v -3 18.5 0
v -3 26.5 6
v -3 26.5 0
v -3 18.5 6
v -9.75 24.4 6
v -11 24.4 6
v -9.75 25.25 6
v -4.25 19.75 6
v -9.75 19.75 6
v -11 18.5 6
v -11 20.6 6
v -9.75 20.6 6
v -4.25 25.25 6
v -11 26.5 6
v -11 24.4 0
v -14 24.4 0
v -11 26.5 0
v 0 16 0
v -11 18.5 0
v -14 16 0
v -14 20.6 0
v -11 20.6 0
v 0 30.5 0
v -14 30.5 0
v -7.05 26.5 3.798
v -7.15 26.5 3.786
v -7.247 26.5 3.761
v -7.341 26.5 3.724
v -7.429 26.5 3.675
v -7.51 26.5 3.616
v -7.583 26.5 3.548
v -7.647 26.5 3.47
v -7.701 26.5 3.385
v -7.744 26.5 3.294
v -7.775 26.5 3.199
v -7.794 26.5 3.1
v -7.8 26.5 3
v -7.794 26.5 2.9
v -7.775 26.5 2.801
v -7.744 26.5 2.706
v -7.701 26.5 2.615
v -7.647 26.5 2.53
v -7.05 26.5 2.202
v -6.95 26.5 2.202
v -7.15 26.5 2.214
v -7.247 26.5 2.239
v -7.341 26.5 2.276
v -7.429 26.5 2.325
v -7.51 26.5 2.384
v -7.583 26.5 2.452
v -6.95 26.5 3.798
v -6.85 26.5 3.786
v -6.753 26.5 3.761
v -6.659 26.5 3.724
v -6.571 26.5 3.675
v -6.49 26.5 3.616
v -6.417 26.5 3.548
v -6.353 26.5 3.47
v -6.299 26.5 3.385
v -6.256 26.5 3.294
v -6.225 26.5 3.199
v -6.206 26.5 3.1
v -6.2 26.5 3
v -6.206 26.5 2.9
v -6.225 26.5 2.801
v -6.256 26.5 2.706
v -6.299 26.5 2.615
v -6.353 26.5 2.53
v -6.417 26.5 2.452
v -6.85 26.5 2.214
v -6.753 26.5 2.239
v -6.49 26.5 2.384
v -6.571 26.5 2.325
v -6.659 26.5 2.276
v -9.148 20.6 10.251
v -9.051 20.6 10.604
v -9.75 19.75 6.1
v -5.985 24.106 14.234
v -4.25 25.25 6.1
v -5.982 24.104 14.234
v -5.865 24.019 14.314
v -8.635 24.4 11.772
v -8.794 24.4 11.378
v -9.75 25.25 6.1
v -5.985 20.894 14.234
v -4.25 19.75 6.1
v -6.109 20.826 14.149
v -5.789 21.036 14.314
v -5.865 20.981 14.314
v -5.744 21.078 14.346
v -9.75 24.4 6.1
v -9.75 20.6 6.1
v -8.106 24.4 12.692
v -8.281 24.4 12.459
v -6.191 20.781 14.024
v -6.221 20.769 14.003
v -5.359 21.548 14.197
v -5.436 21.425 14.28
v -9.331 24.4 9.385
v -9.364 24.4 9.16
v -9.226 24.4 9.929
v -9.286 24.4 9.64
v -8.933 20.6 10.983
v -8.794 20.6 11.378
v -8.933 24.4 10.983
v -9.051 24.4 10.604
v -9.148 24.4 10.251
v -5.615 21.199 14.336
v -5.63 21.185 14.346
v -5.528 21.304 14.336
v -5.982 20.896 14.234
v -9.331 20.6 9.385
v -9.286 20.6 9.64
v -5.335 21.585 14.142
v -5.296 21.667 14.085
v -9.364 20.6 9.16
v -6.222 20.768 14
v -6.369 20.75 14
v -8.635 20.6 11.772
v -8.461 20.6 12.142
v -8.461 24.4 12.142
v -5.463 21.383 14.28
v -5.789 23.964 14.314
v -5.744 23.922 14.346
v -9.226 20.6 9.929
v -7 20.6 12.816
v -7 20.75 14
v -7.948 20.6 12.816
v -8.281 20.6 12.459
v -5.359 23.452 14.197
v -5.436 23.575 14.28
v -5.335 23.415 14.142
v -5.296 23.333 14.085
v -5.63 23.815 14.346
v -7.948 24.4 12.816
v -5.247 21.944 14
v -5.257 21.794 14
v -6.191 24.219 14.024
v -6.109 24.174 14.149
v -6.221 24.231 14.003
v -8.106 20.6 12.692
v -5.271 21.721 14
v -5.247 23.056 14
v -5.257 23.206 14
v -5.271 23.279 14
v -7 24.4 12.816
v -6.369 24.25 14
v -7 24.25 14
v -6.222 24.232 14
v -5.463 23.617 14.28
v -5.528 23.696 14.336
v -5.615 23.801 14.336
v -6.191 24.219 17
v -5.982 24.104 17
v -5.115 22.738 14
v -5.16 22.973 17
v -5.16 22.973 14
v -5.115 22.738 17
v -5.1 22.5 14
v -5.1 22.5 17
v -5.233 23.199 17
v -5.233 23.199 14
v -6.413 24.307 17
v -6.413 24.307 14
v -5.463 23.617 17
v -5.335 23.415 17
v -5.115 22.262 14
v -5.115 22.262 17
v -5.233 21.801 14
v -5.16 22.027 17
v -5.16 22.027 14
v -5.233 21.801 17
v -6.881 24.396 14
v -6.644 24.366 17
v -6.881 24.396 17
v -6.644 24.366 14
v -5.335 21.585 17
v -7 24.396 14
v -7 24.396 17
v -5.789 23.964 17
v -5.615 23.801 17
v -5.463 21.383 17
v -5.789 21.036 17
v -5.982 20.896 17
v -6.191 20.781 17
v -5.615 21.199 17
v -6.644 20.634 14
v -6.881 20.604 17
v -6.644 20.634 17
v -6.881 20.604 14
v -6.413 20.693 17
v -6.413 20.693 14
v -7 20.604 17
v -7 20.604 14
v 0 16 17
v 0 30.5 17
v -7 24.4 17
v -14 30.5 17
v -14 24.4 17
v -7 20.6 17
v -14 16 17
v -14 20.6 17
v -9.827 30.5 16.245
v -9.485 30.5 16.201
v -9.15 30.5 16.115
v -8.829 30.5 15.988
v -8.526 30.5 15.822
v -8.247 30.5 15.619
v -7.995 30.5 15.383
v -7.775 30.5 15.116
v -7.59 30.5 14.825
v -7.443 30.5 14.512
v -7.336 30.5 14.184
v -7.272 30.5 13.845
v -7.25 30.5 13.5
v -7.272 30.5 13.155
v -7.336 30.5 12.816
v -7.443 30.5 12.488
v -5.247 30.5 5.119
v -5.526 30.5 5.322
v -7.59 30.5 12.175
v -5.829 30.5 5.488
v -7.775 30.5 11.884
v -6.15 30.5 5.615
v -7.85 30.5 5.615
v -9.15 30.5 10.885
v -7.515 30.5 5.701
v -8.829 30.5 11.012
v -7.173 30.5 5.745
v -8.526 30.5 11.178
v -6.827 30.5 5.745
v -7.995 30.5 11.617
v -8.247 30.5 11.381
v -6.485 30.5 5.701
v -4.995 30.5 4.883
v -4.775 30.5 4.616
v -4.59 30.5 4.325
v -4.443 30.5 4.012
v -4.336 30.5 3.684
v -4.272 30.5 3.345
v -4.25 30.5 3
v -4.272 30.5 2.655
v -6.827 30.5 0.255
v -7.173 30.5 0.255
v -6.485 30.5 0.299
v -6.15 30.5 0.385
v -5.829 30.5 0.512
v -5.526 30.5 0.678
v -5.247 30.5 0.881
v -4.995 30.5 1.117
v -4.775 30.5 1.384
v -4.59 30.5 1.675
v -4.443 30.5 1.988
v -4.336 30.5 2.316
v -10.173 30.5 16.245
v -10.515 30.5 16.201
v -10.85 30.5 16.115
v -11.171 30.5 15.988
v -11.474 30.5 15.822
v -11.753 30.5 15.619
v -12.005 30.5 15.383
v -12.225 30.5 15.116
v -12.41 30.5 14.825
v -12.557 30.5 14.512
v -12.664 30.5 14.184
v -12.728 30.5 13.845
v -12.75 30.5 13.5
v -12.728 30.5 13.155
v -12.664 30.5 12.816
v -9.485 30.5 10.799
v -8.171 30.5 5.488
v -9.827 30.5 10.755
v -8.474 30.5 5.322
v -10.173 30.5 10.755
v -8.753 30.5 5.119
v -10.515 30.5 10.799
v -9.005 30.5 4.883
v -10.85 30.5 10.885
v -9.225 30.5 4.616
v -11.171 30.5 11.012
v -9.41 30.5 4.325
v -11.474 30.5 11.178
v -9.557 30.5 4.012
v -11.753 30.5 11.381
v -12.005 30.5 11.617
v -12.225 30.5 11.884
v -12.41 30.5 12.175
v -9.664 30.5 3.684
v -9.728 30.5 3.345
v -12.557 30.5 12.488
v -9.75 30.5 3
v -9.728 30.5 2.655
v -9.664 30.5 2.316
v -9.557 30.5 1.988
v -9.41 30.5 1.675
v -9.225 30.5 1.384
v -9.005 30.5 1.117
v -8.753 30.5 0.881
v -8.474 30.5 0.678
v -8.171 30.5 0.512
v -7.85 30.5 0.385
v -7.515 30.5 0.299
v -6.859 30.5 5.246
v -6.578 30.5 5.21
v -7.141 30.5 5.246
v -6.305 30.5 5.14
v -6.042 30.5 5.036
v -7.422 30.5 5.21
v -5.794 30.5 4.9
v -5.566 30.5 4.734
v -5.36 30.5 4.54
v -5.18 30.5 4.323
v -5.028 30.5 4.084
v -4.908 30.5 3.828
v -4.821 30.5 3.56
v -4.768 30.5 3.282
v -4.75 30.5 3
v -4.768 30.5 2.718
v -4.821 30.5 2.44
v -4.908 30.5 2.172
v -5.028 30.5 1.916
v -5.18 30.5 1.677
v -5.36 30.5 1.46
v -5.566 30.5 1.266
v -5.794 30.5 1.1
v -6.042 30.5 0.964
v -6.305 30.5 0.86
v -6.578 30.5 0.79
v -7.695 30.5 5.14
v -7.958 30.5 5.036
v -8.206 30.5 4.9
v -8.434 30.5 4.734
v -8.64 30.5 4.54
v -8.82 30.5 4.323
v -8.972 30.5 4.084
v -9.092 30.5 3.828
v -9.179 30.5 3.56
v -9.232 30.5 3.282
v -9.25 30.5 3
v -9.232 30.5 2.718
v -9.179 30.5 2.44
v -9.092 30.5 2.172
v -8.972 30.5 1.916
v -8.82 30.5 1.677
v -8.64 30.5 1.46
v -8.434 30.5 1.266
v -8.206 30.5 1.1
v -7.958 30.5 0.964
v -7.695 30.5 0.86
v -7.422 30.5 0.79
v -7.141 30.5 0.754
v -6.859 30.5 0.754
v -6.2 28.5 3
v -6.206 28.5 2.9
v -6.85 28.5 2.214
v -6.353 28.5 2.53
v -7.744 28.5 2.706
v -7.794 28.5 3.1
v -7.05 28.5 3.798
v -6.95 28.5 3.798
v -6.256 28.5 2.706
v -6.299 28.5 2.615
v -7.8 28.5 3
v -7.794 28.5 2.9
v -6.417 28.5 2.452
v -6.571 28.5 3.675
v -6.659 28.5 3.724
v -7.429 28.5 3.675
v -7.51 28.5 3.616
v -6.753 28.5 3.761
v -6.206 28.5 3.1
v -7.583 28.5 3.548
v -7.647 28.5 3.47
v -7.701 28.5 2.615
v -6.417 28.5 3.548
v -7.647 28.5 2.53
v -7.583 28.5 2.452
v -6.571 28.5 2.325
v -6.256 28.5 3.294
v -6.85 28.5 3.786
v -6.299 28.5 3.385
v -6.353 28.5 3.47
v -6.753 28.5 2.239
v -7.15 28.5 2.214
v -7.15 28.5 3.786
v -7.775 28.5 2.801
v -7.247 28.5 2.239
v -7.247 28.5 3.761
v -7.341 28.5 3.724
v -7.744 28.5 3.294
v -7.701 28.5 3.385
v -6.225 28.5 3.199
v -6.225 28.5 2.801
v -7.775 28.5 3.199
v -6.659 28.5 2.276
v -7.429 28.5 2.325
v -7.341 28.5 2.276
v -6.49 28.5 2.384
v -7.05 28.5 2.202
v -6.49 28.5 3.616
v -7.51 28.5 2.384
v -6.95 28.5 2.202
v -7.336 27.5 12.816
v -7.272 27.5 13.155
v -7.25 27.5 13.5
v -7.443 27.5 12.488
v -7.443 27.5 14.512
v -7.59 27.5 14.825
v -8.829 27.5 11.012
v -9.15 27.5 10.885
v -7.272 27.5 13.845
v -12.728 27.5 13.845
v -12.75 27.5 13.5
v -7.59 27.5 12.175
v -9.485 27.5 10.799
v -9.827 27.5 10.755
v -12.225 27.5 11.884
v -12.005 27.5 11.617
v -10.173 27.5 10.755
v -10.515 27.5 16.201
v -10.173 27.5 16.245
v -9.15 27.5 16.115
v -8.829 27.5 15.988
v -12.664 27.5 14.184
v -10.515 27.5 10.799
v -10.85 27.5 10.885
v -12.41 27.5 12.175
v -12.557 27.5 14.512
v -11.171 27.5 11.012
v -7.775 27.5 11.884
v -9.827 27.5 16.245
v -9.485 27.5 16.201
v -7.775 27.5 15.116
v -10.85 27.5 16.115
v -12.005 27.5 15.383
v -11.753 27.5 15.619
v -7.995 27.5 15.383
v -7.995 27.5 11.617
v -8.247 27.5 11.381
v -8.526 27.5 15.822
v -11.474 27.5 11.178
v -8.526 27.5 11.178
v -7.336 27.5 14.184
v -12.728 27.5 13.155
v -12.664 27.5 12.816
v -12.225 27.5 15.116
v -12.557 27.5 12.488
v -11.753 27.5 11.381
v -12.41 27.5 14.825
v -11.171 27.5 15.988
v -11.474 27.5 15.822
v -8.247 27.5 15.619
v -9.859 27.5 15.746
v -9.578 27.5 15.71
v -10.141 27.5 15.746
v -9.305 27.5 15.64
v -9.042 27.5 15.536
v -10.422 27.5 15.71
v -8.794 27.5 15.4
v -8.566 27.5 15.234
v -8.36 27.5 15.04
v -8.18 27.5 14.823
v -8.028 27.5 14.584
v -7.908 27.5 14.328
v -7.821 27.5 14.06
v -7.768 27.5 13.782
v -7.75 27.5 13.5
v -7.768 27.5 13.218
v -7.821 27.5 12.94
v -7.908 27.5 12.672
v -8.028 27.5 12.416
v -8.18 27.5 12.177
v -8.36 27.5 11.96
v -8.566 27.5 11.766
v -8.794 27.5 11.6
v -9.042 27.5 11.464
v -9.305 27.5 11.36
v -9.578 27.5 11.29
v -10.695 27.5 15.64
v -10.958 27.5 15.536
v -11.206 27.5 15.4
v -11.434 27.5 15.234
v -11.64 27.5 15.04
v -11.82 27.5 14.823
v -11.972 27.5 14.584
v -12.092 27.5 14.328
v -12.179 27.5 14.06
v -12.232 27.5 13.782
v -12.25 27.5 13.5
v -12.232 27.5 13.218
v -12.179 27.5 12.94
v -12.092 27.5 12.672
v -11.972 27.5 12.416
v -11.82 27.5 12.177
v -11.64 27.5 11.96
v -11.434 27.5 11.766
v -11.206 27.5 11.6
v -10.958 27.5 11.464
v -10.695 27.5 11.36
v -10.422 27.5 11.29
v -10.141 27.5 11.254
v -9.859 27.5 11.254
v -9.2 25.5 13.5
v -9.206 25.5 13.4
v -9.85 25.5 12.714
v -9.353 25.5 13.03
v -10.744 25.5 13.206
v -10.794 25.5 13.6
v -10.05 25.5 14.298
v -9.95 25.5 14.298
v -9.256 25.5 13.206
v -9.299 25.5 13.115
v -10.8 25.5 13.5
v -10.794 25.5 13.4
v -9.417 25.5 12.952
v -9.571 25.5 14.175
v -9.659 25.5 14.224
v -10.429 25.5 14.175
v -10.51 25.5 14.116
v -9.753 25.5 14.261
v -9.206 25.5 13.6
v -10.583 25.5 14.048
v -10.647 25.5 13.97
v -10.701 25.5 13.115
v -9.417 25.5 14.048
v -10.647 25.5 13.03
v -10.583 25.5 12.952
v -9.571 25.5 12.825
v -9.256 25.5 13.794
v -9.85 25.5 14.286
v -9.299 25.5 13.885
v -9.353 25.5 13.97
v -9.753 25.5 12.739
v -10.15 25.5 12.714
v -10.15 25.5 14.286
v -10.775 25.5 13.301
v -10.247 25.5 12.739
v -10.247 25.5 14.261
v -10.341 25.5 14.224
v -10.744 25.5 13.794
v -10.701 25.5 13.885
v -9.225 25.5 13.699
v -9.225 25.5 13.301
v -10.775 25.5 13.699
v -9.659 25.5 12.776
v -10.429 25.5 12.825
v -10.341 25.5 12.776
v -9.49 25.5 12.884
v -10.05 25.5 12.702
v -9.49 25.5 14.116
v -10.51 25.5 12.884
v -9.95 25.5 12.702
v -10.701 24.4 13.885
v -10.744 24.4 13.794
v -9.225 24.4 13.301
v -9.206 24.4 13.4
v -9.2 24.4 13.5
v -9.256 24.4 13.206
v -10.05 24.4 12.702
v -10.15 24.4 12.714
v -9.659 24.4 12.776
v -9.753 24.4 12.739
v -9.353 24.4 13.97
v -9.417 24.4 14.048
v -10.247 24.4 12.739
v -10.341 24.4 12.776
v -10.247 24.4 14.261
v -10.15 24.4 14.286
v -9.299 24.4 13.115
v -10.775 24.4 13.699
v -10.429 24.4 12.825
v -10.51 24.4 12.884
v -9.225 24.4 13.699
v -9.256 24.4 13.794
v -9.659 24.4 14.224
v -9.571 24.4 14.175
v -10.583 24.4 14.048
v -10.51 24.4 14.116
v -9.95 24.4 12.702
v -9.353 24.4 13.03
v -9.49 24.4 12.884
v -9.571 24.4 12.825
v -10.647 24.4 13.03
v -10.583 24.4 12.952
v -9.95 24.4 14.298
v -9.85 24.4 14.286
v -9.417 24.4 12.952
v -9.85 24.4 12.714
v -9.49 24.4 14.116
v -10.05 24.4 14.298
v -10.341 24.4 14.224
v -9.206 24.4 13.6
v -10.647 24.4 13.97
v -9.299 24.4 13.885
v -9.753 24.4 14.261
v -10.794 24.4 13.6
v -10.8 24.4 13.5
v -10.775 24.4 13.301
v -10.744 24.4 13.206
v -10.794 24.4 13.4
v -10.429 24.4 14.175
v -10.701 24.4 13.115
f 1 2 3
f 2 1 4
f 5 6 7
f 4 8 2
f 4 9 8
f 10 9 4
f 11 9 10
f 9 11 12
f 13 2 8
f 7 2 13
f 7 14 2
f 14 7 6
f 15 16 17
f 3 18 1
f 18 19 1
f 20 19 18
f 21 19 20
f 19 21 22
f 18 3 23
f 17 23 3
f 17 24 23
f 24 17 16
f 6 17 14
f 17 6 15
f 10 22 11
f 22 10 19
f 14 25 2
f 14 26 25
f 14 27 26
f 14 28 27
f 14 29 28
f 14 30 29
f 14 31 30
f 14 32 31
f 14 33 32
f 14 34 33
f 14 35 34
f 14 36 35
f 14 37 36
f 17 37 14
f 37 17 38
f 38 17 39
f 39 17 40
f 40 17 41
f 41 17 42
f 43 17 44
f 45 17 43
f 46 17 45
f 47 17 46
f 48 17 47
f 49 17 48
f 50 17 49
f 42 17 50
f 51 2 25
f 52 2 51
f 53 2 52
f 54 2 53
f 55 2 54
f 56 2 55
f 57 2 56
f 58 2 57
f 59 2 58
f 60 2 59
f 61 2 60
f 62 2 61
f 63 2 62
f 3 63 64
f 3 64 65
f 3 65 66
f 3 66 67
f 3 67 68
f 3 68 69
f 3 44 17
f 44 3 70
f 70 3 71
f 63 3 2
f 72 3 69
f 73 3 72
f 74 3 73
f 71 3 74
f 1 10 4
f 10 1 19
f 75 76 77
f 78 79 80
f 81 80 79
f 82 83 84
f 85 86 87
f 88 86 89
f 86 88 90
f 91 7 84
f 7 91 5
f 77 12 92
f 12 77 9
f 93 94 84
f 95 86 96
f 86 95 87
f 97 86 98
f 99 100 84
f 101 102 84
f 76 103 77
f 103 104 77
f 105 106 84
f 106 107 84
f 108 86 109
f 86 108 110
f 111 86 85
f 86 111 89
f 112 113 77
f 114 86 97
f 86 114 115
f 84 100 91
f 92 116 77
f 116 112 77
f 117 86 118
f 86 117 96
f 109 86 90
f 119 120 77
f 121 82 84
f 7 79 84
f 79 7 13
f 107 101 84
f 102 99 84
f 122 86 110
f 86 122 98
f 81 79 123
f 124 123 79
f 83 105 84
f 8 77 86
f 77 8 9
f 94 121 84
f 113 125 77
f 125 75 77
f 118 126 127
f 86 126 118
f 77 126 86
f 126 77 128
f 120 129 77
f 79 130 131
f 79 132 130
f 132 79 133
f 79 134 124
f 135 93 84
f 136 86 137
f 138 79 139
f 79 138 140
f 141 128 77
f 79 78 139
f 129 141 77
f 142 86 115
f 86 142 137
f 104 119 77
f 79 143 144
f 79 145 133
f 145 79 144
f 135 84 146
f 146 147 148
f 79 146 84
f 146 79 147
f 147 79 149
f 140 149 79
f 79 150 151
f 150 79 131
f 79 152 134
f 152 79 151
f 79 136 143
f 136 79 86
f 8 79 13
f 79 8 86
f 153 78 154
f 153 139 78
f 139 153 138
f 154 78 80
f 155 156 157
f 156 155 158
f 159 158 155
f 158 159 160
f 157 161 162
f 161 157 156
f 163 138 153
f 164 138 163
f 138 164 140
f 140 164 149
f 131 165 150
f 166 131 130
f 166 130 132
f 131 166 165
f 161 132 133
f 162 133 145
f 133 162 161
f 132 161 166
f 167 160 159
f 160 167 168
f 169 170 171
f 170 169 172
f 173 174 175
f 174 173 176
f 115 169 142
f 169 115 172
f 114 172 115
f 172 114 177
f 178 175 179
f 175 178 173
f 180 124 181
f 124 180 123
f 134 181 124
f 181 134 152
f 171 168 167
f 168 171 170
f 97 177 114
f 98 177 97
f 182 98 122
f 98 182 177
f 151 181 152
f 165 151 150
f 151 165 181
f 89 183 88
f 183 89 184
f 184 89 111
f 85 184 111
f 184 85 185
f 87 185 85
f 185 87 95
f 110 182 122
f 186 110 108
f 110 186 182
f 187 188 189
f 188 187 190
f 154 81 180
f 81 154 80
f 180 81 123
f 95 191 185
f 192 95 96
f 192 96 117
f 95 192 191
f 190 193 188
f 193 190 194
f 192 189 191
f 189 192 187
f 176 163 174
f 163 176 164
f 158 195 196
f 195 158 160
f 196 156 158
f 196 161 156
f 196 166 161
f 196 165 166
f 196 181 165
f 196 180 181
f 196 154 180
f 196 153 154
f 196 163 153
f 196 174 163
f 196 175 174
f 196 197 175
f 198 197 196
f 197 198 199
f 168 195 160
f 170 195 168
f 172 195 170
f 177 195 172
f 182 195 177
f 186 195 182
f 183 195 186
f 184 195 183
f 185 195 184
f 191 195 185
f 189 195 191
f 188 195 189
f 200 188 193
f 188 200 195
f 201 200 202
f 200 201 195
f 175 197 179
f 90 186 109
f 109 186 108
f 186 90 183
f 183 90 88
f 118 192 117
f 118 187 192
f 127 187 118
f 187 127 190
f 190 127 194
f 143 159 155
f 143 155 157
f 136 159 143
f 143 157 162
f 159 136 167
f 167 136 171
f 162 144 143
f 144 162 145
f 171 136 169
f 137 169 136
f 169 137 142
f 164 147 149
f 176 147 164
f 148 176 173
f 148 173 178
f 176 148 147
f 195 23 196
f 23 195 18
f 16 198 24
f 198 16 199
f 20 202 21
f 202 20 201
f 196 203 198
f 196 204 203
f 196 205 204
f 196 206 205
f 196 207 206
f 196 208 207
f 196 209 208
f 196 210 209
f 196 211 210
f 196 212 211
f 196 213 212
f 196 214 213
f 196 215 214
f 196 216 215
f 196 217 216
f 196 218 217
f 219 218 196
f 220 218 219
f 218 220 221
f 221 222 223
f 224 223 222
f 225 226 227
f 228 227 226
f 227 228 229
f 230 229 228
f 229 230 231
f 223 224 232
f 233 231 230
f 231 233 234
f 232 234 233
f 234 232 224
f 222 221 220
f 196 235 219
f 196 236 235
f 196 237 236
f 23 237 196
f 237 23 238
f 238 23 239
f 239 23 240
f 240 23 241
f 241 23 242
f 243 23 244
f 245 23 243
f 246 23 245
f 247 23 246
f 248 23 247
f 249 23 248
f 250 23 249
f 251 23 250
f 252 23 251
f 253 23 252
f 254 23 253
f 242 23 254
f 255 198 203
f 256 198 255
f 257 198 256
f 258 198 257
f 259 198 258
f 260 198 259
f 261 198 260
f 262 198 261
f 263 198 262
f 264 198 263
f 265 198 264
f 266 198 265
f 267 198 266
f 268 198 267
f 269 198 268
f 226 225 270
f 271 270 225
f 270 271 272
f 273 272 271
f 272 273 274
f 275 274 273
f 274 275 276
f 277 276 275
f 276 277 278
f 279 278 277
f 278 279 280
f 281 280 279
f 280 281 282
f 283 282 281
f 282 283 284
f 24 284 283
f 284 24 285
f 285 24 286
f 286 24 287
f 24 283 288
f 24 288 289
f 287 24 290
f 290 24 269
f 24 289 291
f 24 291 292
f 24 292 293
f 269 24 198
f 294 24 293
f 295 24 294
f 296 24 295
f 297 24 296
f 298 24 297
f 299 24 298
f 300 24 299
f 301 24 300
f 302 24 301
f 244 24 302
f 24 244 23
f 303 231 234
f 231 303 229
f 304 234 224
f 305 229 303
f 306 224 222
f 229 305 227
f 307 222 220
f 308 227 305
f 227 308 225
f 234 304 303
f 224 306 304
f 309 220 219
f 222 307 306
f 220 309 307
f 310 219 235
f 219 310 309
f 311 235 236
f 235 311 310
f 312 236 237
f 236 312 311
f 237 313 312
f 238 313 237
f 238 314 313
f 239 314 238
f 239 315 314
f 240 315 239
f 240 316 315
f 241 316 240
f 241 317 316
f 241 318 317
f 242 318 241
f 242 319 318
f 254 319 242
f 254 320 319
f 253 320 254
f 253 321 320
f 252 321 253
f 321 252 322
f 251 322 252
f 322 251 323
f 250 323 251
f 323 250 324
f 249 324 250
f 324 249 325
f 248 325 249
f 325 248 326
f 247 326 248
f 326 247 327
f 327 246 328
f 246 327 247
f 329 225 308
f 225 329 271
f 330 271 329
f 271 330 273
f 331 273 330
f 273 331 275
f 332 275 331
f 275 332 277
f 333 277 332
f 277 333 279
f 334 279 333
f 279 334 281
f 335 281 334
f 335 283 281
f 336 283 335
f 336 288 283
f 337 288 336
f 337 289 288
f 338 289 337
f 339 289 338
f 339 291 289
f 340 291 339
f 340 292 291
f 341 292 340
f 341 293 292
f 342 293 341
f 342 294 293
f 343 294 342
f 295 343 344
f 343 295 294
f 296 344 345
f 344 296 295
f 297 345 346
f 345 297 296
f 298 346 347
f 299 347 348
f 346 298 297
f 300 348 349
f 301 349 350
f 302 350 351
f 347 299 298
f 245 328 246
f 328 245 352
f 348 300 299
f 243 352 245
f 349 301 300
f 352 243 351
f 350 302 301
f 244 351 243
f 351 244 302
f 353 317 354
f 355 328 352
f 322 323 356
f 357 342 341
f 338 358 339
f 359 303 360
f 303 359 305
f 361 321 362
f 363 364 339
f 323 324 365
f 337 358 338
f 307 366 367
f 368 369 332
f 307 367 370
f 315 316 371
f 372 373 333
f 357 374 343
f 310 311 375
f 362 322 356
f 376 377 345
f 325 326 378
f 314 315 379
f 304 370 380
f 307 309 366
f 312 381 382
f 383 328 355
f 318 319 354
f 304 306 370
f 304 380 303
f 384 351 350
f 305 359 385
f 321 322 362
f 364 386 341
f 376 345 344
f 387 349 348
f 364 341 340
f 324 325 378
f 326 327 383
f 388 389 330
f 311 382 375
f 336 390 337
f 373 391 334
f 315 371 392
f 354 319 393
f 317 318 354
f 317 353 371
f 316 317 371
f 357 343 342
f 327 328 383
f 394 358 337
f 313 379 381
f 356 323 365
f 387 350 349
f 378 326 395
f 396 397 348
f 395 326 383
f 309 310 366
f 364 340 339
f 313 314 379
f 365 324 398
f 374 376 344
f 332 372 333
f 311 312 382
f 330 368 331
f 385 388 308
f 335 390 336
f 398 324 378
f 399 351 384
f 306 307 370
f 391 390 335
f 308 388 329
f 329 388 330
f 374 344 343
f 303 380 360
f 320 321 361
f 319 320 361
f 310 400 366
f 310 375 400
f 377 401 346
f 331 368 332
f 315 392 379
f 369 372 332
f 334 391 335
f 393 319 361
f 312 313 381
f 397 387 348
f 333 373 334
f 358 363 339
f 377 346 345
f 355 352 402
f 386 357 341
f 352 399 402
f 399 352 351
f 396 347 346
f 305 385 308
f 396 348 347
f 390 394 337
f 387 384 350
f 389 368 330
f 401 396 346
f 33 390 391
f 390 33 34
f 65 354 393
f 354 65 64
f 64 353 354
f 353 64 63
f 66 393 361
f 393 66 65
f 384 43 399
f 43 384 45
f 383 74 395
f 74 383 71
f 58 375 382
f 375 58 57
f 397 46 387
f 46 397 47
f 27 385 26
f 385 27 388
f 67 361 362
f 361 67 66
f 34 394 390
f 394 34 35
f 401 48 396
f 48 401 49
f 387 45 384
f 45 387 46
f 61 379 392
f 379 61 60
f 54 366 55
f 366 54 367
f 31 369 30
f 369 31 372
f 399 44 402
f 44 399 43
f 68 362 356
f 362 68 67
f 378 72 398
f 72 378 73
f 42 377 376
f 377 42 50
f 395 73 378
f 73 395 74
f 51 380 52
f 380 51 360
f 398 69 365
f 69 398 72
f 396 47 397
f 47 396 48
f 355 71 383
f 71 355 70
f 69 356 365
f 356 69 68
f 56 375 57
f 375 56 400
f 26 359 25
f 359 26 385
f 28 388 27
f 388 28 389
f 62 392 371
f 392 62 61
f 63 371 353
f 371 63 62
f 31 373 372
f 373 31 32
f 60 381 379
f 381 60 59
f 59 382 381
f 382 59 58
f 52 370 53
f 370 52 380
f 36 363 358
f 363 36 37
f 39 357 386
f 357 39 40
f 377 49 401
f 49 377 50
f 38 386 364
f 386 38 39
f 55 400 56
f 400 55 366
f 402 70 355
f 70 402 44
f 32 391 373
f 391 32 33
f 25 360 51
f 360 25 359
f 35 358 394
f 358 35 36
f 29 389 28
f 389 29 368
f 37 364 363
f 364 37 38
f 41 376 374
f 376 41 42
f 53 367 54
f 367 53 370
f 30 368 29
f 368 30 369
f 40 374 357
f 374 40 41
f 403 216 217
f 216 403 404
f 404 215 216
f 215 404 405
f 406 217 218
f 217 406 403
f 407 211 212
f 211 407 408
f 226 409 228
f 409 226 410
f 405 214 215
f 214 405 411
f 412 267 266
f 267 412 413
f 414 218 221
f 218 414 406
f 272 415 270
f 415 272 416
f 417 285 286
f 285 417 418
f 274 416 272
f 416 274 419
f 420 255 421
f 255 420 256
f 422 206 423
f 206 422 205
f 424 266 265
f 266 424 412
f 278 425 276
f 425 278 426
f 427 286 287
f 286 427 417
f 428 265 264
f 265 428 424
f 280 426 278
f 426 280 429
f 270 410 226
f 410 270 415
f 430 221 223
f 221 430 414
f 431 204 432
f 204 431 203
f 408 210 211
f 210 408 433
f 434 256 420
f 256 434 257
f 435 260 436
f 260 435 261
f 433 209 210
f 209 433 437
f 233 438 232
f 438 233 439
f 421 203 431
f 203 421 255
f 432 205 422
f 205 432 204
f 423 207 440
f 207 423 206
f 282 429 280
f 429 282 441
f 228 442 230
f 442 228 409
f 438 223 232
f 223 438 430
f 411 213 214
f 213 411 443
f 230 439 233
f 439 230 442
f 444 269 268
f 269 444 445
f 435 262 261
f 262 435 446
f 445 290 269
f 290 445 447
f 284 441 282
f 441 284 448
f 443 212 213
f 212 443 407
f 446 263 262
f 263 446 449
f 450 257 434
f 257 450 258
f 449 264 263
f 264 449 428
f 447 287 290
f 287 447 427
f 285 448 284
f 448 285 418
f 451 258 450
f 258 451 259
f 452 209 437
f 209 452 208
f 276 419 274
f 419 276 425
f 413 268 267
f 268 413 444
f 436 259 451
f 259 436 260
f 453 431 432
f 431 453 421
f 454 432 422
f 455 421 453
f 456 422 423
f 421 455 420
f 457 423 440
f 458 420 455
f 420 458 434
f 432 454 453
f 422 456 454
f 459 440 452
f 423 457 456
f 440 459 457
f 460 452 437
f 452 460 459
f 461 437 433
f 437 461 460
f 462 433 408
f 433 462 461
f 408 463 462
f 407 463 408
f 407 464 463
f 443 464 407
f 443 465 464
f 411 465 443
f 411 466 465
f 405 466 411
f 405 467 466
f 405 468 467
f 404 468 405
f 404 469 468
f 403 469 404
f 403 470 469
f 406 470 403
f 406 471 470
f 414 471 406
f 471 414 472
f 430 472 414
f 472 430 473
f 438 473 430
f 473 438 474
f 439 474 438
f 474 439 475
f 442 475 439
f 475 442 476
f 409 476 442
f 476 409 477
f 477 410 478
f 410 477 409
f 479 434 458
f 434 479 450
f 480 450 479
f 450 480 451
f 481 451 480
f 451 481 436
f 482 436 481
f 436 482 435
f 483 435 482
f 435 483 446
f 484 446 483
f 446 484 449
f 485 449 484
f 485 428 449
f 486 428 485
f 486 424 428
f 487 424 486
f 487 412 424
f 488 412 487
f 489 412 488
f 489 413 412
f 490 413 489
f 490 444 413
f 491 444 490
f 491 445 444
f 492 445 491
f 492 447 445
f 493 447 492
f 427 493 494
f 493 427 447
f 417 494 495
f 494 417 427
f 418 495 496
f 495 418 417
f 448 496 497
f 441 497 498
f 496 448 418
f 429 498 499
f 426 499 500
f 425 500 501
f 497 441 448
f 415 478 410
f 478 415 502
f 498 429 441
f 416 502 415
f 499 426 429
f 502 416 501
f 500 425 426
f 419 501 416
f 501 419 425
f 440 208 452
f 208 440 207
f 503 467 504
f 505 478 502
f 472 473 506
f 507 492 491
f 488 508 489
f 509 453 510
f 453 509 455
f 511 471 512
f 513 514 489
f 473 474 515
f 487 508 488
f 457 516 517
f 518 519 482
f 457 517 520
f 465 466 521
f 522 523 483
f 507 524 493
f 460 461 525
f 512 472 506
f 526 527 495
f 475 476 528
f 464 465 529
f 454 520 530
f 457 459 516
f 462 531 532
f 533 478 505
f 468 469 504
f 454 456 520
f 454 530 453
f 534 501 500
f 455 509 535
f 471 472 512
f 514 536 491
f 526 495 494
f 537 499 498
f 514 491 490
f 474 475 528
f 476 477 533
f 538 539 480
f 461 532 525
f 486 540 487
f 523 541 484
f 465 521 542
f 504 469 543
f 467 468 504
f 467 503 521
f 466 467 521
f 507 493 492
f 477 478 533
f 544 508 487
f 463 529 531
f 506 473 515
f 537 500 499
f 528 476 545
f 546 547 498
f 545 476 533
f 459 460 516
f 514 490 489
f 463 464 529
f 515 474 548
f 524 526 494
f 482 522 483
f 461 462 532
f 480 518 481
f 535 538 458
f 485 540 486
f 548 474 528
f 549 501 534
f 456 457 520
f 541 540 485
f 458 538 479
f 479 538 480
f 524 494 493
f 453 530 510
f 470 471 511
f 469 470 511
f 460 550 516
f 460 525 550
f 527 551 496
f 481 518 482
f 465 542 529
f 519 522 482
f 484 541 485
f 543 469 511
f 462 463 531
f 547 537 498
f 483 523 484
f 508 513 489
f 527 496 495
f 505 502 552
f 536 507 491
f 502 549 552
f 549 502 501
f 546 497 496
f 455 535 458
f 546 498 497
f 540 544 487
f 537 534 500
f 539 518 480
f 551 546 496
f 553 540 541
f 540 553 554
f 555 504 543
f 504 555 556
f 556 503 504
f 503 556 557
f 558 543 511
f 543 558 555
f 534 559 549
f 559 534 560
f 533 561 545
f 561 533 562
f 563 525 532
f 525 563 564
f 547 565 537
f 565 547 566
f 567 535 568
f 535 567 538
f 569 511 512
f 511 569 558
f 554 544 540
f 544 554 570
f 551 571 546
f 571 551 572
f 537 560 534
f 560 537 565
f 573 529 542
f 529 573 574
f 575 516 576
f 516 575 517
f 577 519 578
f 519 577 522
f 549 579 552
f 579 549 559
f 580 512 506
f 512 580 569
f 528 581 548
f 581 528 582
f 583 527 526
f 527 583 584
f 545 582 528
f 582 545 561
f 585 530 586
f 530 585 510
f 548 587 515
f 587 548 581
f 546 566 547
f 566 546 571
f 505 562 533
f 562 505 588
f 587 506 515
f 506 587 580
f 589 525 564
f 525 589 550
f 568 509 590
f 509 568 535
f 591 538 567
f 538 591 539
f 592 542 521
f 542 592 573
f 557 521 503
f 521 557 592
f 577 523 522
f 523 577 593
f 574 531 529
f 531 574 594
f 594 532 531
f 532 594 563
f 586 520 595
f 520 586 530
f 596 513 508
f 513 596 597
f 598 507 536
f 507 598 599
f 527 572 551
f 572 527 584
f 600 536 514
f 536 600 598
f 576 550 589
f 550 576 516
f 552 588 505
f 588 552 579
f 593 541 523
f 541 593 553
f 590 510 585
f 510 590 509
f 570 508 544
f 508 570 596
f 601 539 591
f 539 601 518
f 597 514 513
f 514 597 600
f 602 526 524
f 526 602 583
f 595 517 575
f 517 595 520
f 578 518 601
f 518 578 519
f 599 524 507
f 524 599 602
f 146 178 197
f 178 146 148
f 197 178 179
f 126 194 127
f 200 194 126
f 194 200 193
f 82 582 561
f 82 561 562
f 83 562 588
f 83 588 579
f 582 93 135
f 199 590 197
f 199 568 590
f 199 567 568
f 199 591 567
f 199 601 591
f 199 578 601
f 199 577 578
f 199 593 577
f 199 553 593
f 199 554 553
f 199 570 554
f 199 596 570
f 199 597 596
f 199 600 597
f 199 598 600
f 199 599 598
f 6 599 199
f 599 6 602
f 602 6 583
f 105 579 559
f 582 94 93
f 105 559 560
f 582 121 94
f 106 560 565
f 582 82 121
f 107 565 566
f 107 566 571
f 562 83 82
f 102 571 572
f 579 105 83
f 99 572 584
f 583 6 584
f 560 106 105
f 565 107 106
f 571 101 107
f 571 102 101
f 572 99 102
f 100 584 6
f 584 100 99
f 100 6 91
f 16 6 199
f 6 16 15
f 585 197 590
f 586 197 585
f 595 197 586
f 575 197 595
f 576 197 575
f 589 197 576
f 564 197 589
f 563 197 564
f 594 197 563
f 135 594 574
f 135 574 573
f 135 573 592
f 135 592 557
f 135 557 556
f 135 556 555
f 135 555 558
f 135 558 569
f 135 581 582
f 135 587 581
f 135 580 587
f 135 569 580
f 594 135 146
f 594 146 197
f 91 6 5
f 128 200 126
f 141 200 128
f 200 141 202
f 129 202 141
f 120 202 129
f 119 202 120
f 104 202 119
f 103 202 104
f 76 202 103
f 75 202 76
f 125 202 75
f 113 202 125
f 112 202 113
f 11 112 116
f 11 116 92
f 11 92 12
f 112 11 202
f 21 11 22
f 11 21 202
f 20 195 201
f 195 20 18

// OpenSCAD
$fn = 50 ;
e = 3 ;

ruban_e = 2 ;
ruban_languette_e = 3.5 ;
ruban_l = 31 ;

butee_z = 2*e ;

chaussure_l_min = 80;
chaussure_l_max = 85;

fil_d = 3.0 ;

cny70_x = 8 ;
cny70_y = 8 ;
cny70_z = 6.0 ;
cny70_patte_x = 5.5 ;
cny70_patte_y = 5.5 ;
cny70_patte_z = 8 ;
cny70_fil_l = e ;

ycaptplus = 1 ;
cny70_capsule_x = cny70_x + 2*e ;
cny70_capsule_y = cny70_x + 2*e ;
cny70_capsule_z = cny70_z + cny70_patte_z + cny70_fil_l  ;

d_fil = 3.8;
lien_l = 3 ;
lien_e = 1.5 ;

// diametre vis
vis_d = 1.6 ;
vis_l = 3 ;
vis_tete_d = 4.5 ;
vis_tete_l=2 ;

module vis()
{
    translate([0,0,5])
        cylinder(d=vis_tete_d+1,h=10,center=true);
    translate([0,0,-vis_tete_l/2])
        cylinder(d1=vis_d,d2=vis_tete_d,h=vis_tete_l,center=true);
    translate([0,0,-vis_l/2-vis_tete_l])
        cylinder(d=vis_d,h=vis_l,center=true);
}
module cny70()
{
    // capteur
    translate([0,0,cny70_z/2])
        cube([cny70_x,cny70_y,cny70_z],center = true);
    // fils
    hull()
    {
        translate([0,0,0.05+cny70_z])
            cube([cny70_patte_x,cny70_patte_y,0.1],center = true);
        translate([0,0,cny70_patte_z+cny70_z])
            cylinder(d=fil_d,h=4,center=true);
    }
    translate([0,0,cny70_patte_z+cny70_z+cny70_fil_l/2])
        cylinder(d= d_fil,h=cny70_fil_l,center= true);
    *translate([0,0,cny70_patte_z/2+cny70_z])
        cube([cny70_patte_x,cny70_patte_y,cny70_patte_z],center = true);
    *translate([0,0,(cny70_fil_l+6)/2+cny70_patte_z+cny70_z])
        cylinder(d=fil_d,h=cny70_fil_l +6,center=true);

}
module cny70_capsule()
{
    difference()
    {
        translate([0,ycaptplus/2,cny70_capsule_z/2])
            cube([cny70_capsule_x,cny70_capsule_y+ycaptplus,cny70_capsule_z],center = true);
        cny70();
    }
}

module plaque()
{
    difference()
    {
        union()
        {
            //plaque
            hull()
            {
                // plaque
                translate([ chaussure_l_max/2, 0, e/2 ])
                    cube([ chaussure_l_max , ruban_l + 2*e , e ], center = true);
                // support capteur
                translate([-cny70_capsule_x/2, cny70_capsule_y/2 + ruban_l / 2+ycaptplus/2, e/2])
                    cube([cny70_capsule_x,cny70_capsule_y+ycaptplus, e],center = true);
                // support butee
                translate([-cny70_capsule_x/2, 0, e/2])
                    cube([cny70_capsule_x ,ruban_l + 2*e, e],center = true);
            }
            //butee
            translate([ - e / 2,0,butee_z/2 + e/2])
                cube([e, ruban_l + 2*e , butee_z ], center = true);
            // capteur
            translate([-cny70_capsule_x/2,cny70_capsule_y/2 + ruban_l / 2 ,0 ])
                cny70_capsule();
            // accroche cable
            translate([ -cny70_capsule_x/2 ,-(ruban_l + 2*e)/2+ (2*e+lien_l)/2,e/2 + 2])
                cube([cny70_capsule_x, (2*e+lien_l) , e ], center = true);
       }
       // fente adaptation taille
        translate([100 + chaussure_l_min,0,0])
            cube([200, ruban_l  , 2*e ], center = true);
        // fente ruban          
        translate([-ruban_languette_e/2 - e,0,0])
            cube([ruban_languette_e, ruban_l  , 100 ], center = true);            
        // capteur
        translate([-cny70_capsule_x/2, cny70_capsule_y/2 + ruban_l / 2, 0])
            cny70();
        translate([-cny70_capsule_x, cny70_capsule_y/2 + ruban_l / 2, 0])
            cube([cny70_capsule_x,d_fil,100],center = true);
       // accroche cable
        //dessous
        translate([ -cny70_capsule_x/2 -e -1 ,-(ruban_l + 2*e)/2+ (2*e+lien_l)/2,lien_e/2])
            cube([cny70_capsule_x, lien_l , lien_e ], center = true);
        //cotes
        translate([ -cny70_capsule_x + lien_e/2,-(ruban_l + 2*e)/2+ (2*e+lien_l)/2,0])
            cube([lien_e, lien_l , 10 ], center = true);
        translate([  -e -ruban_languette_e - lien_e/2,-(ruban_l + 2*e)/2+ (2*e+lien_l)/2,0])
            cube([lien_e, lien_l , 10 ], center = true);

        // vis
        translate([-cny70_capsule_x/2, cny70_capsule_y + ruban_l / 2 +ycaptplus,cny70_z/ 2])
            rotate([-90,0,0])
                vis() ;
        translate([-cny70_capsule_x/2 - fil_d, cny70_capsule_y + ruban_l / 2 +ycaptplus-3,cny70_capsule_z - vis_tete_d +1 ])
            rotate([-90,0,0])
                vis() ;
        }
}
*difference()
{
    translate([0, 0, cny70_capsule_z/2])
        cube([cny70_capsule_x,cny70_capsule_y, cny70_capsule_z],center = true);
    cny70();
}
*cny70();
difference()
{
    plaque() ;
    translate([500,0,0])
        cube([1000,1000,1000],center=true);
    translate([0,-484,0])
        cube([1000,1000,1000],center=true);
}
*plaque();
*translate ([0,ruban_l +30,0,])
    rotate([0,0,180])
        mirror([1,0,0]) plaque();
